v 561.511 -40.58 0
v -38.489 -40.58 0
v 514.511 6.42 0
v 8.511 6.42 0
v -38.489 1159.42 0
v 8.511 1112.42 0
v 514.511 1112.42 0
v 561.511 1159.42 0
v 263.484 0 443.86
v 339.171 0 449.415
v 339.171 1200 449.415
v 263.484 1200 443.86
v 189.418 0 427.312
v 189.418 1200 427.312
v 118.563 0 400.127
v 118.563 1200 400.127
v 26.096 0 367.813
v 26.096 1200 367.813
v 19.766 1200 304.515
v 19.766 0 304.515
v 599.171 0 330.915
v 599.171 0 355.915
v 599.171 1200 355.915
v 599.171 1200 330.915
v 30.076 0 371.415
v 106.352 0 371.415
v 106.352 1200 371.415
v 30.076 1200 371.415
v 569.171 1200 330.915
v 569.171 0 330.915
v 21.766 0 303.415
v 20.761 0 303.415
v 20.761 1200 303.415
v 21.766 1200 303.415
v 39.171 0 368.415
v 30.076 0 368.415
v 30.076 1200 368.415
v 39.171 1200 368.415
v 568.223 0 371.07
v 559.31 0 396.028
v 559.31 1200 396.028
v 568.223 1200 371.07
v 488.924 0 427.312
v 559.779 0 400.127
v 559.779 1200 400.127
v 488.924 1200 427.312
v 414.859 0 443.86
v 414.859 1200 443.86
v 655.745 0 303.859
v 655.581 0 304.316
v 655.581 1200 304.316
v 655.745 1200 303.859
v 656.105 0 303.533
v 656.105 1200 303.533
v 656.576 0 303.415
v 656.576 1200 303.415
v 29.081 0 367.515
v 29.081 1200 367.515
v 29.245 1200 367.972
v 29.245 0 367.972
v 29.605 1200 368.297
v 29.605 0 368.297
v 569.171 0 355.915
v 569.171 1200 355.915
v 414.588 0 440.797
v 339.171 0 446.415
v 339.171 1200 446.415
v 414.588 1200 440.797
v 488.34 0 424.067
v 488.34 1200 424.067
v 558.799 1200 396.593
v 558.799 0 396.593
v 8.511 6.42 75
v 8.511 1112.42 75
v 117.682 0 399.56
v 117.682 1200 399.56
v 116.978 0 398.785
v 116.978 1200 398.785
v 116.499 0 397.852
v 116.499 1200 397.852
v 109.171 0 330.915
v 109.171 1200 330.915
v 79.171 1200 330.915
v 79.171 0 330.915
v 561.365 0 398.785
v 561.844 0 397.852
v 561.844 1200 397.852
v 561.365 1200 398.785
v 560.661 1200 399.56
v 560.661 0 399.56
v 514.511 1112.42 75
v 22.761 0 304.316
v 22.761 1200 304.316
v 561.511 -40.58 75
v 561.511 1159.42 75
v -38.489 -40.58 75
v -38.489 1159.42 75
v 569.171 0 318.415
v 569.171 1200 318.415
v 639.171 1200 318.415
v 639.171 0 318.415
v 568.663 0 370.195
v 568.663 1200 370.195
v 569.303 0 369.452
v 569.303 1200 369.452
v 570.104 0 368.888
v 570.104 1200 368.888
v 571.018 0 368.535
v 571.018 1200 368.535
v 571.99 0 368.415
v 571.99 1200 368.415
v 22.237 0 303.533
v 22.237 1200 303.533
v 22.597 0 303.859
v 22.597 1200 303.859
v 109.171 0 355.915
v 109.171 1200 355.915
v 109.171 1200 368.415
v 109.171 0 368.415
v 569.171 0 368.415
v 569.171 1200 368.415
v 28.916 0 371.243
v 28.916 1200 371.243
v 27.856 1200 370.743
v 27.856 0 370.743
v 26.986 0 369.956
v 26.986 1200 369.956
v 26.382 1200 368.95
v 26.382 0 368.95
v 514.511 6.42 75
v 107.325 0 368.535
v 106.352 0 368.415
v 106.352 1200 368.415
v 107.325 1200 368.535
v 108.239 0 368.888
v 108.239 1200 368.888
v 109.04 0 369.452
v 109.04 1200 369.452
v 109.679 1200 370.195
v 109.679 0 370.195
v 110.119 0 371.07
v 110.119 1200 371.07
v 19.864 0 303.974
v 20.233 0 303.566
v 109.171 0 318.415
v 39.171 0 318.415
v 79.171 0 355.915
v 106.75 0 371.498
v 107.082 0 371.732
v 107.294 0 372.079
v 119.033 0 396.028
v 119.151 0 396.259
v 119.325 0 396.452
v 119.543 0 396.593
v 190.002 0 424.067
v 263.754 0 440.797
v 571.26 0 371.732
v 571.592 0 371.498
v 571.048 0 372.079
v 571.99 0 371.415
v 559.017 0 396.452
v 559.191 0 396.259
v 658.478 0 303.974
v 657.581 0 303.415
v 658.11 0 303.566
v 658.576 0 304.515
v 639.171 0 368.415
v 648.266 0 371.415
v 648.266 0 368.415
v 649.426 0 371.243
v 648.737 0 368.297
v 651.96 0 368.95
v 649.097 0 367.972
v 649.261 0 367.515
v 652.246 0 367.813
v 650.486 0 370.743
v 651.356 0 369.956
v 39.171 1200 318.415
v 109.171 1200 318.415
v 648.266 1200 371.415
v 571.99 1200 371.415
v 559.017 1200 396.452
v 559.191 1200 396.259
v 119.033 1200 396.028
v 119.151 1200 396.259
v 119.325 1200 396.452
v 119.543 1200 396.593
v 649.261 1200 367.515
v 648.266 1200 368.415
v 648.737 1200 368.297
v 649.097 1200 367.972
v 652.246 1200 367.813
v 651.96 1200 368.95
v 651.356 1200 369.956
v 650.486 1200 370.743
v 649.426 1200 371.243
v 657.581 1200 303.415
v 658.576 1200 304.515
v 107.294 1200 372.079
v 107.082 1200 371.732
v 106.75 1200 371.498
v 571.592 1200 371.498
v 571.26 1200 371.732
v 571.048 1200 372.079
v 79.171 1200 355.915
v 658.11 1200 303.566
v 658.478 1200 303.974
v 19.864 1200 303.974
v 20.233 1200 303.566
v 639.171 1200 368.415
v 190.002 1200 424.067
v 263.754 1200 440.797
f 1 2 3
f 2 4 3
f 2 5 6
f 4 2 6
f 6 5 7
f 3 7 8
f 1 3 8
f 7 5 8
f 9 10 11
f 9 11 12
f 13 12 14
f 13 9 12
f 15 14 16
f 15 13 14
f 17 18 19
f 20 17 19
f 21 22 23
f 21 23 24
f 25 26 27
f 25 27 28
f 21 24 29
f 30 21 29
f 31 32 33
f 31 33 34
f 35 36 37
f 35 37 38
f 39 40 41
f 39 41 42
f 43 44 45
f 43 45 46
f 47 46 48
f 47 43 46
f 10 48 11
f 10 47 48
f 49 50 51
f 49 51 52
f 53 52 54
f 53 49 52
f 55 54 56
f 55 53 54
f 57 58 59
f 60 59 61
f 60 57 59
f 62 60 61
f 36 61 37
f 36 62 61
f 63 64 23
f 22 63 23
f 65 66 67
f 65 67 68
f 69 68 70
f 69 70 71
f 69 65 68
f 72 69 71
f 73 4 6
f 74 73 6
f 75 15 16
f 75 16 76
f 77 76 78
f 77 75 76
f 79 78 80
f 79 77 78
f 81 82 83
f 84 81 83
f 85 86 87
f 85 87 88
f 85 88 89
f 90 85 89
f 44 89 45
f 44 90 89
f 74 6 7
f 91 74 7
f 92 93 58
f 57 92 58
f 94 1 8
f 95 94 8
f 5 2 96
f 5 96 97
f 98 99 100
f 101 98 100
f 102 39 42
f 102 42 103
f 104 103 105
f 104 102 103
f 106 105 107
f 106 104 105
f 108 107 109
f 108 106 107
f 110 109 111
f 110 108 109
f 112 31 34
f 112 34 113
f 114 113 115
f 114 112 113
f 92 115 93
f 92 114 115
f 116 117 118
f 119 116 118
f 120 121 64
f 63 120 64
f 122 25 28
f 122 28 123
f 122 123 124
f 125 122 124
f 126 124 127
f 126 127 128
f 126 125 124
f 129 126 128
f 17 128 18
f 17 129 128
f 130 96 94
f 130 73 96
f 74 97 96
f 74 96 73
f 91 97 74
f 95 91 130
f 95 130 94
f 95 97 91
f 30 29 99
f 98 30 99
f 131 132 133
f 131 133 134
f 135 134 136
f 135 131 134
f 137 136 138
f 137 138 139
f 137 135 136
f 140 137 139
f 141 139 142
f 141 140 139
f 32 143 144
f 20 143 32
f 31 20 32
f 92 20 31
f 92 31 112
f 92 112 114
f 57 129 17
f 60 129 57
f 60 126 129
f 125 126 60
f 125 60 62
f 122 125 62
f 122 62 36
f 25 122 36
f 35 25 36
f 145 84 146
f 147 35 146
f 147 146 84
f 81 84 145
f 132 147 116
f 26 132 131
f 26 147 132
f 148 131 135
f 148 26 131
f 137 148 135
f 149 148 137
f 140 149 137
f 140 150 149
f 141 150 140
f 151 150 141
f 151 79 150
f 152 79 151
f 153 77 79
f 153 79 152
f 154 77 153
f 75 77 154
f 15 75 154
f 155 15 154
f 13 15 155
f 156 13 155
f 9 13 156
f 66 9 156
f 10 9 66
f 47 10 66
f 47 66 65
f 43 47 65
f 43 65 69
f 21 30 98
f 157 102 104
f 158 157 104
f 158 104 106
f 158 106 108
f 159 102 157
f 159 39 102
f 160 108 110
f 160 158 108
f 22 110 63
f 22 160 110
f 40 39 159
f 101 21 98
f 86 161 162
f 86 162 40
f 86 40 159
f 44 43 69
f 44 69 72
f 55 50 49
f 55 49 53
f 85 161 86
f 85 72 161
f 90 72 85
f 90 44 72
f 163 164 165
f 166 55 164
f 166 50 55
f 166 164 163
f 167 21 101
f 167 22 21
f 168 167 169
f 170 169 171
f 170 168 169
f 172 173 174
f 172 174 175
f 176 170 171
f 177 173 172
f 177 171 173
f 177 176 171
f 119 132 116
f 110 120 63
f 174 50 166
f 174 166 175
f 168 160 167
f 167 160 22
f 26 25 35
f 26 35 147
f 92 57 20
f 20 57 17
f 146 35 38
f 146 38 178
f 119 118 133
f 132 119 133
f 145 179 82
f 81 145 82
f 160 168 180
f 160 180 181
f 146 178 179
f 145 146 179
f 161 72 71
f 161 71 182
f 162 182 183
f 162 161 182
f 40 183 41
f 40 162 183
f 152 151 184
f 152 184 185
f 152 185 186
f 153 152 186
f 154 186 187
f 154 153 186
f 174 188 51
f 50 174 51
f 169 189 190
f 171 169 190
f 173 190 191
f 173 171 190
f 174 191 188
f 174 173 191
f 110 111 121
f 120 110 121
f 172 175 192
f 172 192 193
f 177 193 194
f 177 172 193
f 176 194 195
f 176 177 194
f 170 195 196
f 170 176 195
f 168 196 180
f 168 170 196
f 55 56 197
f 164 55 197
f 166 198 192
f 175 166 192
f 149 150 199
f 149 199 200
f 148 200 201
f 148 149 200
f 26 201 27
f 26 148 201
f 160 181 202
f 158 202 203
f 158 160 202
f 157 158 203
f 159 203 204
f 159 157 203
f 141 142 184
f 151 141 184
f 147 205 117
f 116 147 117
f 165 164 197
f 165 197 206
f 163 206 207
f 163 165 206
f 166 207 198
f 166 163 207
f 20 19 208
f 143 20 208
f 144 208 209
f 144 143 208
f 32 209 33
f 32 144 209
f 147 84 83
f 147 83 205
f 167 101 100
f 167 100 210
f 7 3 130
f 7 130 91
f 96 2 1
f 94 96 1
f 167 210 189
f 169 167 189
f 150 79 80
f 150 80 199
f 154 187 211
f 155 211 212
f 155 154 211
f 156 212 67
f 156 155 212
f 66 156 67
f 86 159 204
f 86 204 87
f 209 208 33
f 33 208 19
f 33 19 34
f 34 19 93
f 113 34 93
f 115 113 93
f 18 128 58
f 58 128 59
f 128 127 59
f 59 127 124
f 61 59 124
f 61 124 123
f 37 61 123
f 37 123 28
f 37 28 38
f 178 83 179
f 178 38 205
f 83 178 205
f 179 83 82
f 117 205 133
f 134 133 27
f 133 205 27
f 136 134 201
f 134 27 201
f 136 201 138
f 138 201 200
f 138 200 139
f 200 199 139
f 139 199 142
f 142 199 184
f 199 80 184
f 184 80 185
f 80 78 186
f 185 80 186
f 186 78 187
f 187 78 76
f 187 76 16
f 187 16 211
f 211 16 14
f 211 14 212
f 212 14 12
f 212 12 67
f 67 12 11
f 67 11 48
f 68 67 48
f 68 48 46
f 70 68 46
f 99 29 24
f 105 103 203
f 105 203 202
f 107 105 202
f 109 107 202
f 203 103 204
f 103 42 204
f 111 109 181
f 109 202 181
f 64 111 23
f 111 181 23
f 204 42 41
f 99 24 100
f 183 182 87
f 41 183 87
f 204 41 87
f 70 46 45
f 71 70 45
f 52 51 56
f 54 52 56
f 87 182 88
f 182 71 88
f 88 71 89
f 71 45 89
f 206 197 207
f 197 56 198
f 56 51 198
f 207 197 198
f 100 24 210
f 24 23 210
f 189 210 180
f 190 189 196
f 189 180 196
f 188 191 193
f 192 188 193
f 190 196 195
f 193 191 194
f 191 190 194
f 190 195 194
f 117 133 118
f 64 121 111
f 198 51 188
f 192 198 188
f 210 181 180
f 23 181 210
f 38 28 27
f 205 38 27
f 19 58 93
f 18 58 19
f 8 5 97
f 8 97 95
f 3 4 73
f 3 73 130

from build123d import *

# Parameters (mm, degrees)
F0_W     = 600
F0_H     = 1200
F0_W_2   = 506
F0_H_2   = 1106
F1_DEPTH = 75
F3_DEPTH = 1200


with BuildPart() as f1:
    # F0 (on Top) → F1 (new body)
    with BuildSketch(Plane.XY):
        with Locations((261.511236, 559.420215)):
            Rectangle(F0_W, F0_H)
        with Locations((261.511236, 559.420215)):
            Rectangle(F0_W_2, F0_H_2, mode=Mode.SUBTRACT)
    extrude(amount=F1_DEPTH)


with BuildPart() as f3:
    # F2 (on Front) → F3 (new body)
    with BuildSketch(Plane.XZ):
        Polygon((39.171193, 368.415314), (39.171193, 318.415314), (109.171193, 318.415314), (109.171193, 330.915314), (79.171193, 330.915314), (79.171193, 355.915314), (109.171193, 355.915314), (109.171193, 368.415314), (106.352316, 368.415314), align=None)
        Polygon((639.171193, 368.415314), (571.99007, 368.415314), (569.171193, 368.415314), (569.171193, 355.915314), (599.171193, 355.915314), (599.171193, 330.915314), (569.171193, 330.915314), (569.171193, 318.415314), (639.171193, 318.415314), align=None)
        with BuildLine():
            Line((339.171193, 449.415314), (339.171193, 446.415314))
            ThreePointArc((339.171193, 446.415314), (451.775363, 433.80357), (558.799434, 396.593314))
            ThreePointArc((558.799434, 396.593314), (559.110554, 396.360921), (559.309687, 396.027532))
            Line((559.309687, 396.027532), (568.223102, 371.069968))
            ThreePointArc((568.223102, 371.069968), (569.685876, 369.145652), (571.99007, 368.415314))
            Line((571.99007, 368.415314), (639.171193, 368.415314))
            Line((639.171193, 368.415314), (648.266206, 368.415314))
            ThreePointArc((648.266206, 368.415314), (648.937211, 368.156766), (649.261243, 367.514818))
            Line((649.261243, 367.514818), (655.581144, 304.31581))
            ThreePointArc((655.581144, 304.31581), (655.905175, 303.673861), (656.576181, 303.415314))
            Line((656.576181, 303.415314), (657.581168, 303.415314))
            ThreePointArc((657.581168, 303.415314), (658.322621, 303.744309), (658.576205, 304.514818))
            Line((658.576205, 304.514818), (652.246354, 367.813329))
            ThreePointArc((652.246354, 367.813329), (650.950227, 370.381124), (648.266206, 371.415314))
            Line((648.266206, 371.415314), (571.99007, 371.415314))
            ThreePointArc((571.99007, 371.415314), (571.414022, 371.597898), (571.048328, 372.078978))
            Line((571.048328, 372.078978), (561.84351, 397.852467))
            ThreePointArc((561.84351, 397.852467), (561.03823, 399.195691), (559.778937, 400.12677))
            ThreePointArc((559.778937, 400.12677), (452.194573, 436.943128), (339.171193, 449.415314))
        make_face()
        with BuildLine():
            Line((30.076181, 368.415314), (39.171193, 368.415314))
            Line((39.171193, 368.415314), (106.352316, 368.415314))
            ThreePointArc((106.352316, 368.415314), (108.65651, 369.145652), (110.119284, 371.069968))
            Line((110.119284, 371.069968), (119.0327, 396.027532))
            ThreePointArc((119.0327, 396.027532), (119.231833, 396.360921), (119.542952, 396.593314))
            ThreePointArc((119.542952, 396.593314), (226.567024, 433.80357), (339.171193, 446.415314))
            Line((339.171193, 446.415314), (339.171193, 449.415314))
            ThreePointArc((339.171193, 449.415314), (226.147814, 436.943128), (118.563449, 400.12677))
            ThreePointArc((118.563449, 400.12677), (117.304156, 399.195691), (116.498876, 397.852467))
            Line((116.498876, 397.852467), (107.294058, 372.078978))
            ThreePointArc((107.294058, 372.078978), (106.928365, 371.597898), (106.352316, 371.415314))
            Line((106.352316, 371.415314), (30.076181, 371.415314))
            ThreePointArc((30.076181, 371.415314), (27.392159, 370.381124), (26.096032, 367.813329))
            Line((26.096032, 367.813329), (19.766181, 304.514818))
            ThreePointArc((19.766181, 304.514818), (20.019766, 303.744309), (20.761218, 303.415314))
            Line((20.761218, 303.415314), (21.766206, 303.415314))
            ThreePointArc((21.766206, 303.415314), (22.437211, 303.673861), (22.761243, 304.31581))
            Line((22.761243, 304.31581), (29.081144, 367.514818))
            ThreePointArc((29.081144, 367.514818), (29.405175, 368.156766), (30.076181, 368.415314))
        make_face()
    extrude(amount=-F3_DEPTH)


solid = Compound([f1.part, f3.part])
